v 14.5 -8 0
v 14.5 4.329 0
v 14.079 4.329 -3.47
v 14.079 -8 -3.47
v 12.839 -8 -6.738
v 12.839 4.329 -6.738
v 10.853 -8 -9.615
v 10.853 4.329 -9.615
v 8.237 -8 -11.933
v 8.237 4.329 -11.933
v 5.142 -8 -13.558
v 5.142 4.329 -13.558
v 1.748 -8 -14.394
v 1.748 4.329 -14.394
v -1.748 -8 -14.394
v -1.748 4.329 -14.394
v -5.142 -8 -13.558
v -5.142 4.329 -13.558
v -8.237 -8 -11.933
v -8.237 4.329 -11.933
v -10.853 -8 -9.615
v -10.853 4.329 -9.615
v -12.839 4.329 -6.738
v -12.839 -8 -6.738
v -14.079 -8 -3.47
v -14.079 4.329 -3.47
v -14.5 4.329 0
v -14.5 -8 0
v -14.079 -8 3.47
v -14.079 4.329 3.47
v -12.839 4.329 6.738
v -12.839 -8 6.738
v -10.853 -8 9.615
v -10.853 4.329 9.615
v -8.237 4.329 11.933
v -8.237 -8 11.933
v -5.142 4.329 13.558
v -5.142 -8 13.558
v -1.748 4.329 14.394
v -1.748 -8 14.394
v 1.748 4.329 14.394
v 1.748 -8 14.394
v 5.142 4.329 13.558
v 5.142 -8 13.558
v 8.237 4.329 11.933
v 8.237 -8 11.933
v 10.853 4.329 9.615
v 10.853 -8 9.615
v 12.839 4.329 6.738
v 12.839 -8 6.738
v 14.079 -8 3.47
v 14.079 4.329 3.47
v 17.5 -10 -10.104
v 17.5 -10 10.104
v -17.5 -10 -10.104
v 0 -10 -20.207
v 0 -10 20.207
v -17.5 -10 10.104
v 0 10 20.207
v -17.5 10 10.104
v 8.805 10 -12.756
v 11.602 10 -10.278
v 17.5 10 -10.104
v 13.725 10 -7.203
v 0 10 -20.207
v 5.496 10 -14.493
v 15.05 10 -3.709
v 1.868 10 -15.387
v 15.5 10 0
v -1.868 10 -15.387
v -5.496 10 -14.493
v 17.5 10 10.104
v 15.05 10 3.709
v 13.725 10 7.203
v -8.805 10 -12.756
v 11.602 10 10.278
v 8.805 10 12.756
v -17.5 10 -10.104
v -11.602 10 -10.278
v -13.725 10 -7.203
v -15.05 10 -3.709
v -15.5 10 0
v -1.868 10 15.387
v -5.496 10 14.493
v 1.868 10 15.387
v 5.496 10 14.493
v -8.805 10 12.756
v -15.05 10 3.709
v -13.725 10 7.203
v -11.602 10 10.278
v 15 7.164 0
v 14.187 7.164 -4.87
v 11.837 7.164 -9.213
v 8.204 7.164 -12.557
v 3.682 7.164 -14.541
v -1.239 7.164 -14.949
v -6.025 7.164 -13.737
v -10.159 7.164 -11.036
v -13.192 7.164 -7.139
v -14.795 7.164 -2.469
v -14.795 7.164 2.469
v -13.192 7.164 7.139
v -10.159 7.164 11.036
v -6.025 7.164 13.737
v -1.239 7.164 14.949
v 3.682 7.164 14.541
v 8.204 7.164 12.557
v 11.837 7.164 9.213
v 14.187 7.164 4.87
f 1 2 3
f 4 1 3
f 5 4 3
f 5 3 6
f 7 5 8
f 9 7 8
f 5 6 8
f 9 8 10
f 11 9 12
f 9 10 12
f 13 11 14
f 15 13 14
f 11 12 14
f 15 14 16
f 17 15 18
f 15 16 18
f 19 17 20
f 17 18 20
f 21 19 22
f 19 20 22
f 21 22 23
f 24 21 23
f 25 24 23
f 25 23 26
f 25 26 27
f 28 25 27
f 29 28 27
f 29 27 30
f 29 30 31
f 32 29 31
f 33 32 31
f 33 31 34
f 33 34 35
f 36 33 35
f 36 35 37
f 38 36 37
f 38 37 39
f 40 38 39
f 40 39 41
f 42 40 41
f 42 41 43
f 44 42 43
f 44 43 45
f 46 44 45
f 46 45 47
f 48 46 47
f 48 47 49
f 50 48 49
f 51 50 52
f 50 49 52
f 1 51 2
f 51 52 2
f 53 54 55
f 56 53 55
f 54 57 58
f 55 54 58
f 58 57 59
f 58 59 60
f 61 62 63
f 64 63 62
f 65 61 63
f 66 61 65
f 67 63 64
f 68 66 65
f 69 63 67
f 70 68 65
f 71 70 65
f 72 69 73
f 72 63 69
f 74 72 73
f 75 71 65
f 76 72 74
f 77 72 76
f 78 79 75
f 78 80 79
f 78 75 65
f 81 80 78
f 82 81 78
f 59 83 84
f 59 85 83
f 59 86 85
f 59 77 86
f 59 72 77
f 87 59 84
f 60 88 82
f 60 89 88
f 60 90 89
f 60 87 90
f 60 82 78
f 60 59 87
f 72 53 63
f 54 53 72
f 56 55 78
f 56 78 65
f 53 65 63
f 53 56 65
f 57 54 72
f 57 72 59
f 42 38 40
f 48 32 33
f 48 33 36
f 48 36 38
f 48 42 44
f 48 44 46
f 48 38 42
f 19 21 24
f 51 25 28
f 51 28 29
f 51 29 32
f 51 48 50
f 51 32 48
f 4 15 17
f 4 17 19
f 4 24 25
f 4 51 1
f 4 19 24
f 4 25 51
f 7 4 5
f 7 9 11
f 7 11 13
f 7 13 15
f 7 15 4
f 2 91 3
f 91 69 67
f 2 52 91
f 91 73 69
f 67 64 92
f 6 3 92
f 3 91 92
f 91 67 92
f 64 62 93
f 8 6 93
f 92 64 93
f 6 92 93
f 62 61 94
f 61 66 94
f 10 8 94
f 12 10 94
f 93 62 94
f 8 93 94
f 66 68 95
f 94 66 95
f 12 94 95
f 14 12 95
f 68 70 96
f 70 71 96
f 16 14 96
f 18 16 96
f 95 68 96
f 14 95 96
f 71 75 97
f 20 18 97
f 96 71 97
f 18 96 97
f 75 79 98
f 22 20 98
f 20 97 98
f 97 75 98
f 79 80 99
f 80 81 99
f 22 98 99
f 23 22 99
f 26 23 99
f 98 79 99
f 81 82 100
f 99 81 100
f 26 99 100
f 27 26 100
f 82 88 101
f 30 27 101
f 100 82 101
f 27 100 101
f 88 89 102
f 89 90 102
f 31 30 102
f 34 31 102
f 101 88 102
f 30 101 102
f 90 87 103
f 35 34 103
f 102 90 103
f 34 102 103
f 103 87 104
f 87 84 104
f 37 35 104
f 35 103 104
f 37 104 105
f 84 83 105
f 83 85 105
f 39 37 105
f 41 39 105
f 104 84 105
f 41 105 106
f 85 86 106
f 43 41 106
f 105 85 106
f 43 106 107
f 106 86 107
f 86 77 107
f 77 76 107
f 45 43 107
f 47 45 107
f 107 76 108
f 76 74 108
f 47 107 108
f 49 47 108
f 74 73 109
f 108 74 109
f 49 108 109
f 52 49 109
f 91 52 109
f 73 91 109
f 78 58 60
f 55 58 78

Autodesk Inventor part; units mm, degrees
ref_plane "YZ Plane" through (0, 0, 0) normal (1, 0, 0) x (0, 1, 0)
ref_plane "XZ Plane" through (0, 0, 0) normal (0, 1, 0) x (-1, 0, 0)
ref_plane "XY Plane" through (0, 0, 0) normal (0, 0, 1) x (1, 0, 0)
sketch "Sketch1" plane through (0, 0, 0) normal (0, 1, 0) x (-1, 0, 0)
  line L0 (-17.5, 10.1036) -> (0, 20.2073)
  line L1 (0, 20.2073) -> (17.5, 10.1036)
  line L2 (17.5, 10.1036) -> (17.5, -10.1036)
  line L3 (17.5, -10.1036) -> (0, -20.2073)
  line L4 (0, -20.2073) -> (-17.5, -10.1036)
  line L5 (-17.5, -10.1036) -> (-17.5, 10.1036)
  point P0 (0, 0)
  point P1 (0, 0)
  dimension "d0" = 35
extrude "Extrusion1" add sketch "Sketch1" along normal mid plane 20
sketch "Sketch2" plane through (0, 10, 0) normal (0, 1, 0) x (1, 0, 0)
  circle A0 centre (0, 0) radius 14.5
  dimension "d3" = 29
extrude "Extrusion2" cut sketch "Sketch2" against normal blind 18
chamfer "Chamfer1" distance 1 angle 80 1 edges at (-14.5, 10, 0) measured on face at (-8.579, 10, 14.0814)
